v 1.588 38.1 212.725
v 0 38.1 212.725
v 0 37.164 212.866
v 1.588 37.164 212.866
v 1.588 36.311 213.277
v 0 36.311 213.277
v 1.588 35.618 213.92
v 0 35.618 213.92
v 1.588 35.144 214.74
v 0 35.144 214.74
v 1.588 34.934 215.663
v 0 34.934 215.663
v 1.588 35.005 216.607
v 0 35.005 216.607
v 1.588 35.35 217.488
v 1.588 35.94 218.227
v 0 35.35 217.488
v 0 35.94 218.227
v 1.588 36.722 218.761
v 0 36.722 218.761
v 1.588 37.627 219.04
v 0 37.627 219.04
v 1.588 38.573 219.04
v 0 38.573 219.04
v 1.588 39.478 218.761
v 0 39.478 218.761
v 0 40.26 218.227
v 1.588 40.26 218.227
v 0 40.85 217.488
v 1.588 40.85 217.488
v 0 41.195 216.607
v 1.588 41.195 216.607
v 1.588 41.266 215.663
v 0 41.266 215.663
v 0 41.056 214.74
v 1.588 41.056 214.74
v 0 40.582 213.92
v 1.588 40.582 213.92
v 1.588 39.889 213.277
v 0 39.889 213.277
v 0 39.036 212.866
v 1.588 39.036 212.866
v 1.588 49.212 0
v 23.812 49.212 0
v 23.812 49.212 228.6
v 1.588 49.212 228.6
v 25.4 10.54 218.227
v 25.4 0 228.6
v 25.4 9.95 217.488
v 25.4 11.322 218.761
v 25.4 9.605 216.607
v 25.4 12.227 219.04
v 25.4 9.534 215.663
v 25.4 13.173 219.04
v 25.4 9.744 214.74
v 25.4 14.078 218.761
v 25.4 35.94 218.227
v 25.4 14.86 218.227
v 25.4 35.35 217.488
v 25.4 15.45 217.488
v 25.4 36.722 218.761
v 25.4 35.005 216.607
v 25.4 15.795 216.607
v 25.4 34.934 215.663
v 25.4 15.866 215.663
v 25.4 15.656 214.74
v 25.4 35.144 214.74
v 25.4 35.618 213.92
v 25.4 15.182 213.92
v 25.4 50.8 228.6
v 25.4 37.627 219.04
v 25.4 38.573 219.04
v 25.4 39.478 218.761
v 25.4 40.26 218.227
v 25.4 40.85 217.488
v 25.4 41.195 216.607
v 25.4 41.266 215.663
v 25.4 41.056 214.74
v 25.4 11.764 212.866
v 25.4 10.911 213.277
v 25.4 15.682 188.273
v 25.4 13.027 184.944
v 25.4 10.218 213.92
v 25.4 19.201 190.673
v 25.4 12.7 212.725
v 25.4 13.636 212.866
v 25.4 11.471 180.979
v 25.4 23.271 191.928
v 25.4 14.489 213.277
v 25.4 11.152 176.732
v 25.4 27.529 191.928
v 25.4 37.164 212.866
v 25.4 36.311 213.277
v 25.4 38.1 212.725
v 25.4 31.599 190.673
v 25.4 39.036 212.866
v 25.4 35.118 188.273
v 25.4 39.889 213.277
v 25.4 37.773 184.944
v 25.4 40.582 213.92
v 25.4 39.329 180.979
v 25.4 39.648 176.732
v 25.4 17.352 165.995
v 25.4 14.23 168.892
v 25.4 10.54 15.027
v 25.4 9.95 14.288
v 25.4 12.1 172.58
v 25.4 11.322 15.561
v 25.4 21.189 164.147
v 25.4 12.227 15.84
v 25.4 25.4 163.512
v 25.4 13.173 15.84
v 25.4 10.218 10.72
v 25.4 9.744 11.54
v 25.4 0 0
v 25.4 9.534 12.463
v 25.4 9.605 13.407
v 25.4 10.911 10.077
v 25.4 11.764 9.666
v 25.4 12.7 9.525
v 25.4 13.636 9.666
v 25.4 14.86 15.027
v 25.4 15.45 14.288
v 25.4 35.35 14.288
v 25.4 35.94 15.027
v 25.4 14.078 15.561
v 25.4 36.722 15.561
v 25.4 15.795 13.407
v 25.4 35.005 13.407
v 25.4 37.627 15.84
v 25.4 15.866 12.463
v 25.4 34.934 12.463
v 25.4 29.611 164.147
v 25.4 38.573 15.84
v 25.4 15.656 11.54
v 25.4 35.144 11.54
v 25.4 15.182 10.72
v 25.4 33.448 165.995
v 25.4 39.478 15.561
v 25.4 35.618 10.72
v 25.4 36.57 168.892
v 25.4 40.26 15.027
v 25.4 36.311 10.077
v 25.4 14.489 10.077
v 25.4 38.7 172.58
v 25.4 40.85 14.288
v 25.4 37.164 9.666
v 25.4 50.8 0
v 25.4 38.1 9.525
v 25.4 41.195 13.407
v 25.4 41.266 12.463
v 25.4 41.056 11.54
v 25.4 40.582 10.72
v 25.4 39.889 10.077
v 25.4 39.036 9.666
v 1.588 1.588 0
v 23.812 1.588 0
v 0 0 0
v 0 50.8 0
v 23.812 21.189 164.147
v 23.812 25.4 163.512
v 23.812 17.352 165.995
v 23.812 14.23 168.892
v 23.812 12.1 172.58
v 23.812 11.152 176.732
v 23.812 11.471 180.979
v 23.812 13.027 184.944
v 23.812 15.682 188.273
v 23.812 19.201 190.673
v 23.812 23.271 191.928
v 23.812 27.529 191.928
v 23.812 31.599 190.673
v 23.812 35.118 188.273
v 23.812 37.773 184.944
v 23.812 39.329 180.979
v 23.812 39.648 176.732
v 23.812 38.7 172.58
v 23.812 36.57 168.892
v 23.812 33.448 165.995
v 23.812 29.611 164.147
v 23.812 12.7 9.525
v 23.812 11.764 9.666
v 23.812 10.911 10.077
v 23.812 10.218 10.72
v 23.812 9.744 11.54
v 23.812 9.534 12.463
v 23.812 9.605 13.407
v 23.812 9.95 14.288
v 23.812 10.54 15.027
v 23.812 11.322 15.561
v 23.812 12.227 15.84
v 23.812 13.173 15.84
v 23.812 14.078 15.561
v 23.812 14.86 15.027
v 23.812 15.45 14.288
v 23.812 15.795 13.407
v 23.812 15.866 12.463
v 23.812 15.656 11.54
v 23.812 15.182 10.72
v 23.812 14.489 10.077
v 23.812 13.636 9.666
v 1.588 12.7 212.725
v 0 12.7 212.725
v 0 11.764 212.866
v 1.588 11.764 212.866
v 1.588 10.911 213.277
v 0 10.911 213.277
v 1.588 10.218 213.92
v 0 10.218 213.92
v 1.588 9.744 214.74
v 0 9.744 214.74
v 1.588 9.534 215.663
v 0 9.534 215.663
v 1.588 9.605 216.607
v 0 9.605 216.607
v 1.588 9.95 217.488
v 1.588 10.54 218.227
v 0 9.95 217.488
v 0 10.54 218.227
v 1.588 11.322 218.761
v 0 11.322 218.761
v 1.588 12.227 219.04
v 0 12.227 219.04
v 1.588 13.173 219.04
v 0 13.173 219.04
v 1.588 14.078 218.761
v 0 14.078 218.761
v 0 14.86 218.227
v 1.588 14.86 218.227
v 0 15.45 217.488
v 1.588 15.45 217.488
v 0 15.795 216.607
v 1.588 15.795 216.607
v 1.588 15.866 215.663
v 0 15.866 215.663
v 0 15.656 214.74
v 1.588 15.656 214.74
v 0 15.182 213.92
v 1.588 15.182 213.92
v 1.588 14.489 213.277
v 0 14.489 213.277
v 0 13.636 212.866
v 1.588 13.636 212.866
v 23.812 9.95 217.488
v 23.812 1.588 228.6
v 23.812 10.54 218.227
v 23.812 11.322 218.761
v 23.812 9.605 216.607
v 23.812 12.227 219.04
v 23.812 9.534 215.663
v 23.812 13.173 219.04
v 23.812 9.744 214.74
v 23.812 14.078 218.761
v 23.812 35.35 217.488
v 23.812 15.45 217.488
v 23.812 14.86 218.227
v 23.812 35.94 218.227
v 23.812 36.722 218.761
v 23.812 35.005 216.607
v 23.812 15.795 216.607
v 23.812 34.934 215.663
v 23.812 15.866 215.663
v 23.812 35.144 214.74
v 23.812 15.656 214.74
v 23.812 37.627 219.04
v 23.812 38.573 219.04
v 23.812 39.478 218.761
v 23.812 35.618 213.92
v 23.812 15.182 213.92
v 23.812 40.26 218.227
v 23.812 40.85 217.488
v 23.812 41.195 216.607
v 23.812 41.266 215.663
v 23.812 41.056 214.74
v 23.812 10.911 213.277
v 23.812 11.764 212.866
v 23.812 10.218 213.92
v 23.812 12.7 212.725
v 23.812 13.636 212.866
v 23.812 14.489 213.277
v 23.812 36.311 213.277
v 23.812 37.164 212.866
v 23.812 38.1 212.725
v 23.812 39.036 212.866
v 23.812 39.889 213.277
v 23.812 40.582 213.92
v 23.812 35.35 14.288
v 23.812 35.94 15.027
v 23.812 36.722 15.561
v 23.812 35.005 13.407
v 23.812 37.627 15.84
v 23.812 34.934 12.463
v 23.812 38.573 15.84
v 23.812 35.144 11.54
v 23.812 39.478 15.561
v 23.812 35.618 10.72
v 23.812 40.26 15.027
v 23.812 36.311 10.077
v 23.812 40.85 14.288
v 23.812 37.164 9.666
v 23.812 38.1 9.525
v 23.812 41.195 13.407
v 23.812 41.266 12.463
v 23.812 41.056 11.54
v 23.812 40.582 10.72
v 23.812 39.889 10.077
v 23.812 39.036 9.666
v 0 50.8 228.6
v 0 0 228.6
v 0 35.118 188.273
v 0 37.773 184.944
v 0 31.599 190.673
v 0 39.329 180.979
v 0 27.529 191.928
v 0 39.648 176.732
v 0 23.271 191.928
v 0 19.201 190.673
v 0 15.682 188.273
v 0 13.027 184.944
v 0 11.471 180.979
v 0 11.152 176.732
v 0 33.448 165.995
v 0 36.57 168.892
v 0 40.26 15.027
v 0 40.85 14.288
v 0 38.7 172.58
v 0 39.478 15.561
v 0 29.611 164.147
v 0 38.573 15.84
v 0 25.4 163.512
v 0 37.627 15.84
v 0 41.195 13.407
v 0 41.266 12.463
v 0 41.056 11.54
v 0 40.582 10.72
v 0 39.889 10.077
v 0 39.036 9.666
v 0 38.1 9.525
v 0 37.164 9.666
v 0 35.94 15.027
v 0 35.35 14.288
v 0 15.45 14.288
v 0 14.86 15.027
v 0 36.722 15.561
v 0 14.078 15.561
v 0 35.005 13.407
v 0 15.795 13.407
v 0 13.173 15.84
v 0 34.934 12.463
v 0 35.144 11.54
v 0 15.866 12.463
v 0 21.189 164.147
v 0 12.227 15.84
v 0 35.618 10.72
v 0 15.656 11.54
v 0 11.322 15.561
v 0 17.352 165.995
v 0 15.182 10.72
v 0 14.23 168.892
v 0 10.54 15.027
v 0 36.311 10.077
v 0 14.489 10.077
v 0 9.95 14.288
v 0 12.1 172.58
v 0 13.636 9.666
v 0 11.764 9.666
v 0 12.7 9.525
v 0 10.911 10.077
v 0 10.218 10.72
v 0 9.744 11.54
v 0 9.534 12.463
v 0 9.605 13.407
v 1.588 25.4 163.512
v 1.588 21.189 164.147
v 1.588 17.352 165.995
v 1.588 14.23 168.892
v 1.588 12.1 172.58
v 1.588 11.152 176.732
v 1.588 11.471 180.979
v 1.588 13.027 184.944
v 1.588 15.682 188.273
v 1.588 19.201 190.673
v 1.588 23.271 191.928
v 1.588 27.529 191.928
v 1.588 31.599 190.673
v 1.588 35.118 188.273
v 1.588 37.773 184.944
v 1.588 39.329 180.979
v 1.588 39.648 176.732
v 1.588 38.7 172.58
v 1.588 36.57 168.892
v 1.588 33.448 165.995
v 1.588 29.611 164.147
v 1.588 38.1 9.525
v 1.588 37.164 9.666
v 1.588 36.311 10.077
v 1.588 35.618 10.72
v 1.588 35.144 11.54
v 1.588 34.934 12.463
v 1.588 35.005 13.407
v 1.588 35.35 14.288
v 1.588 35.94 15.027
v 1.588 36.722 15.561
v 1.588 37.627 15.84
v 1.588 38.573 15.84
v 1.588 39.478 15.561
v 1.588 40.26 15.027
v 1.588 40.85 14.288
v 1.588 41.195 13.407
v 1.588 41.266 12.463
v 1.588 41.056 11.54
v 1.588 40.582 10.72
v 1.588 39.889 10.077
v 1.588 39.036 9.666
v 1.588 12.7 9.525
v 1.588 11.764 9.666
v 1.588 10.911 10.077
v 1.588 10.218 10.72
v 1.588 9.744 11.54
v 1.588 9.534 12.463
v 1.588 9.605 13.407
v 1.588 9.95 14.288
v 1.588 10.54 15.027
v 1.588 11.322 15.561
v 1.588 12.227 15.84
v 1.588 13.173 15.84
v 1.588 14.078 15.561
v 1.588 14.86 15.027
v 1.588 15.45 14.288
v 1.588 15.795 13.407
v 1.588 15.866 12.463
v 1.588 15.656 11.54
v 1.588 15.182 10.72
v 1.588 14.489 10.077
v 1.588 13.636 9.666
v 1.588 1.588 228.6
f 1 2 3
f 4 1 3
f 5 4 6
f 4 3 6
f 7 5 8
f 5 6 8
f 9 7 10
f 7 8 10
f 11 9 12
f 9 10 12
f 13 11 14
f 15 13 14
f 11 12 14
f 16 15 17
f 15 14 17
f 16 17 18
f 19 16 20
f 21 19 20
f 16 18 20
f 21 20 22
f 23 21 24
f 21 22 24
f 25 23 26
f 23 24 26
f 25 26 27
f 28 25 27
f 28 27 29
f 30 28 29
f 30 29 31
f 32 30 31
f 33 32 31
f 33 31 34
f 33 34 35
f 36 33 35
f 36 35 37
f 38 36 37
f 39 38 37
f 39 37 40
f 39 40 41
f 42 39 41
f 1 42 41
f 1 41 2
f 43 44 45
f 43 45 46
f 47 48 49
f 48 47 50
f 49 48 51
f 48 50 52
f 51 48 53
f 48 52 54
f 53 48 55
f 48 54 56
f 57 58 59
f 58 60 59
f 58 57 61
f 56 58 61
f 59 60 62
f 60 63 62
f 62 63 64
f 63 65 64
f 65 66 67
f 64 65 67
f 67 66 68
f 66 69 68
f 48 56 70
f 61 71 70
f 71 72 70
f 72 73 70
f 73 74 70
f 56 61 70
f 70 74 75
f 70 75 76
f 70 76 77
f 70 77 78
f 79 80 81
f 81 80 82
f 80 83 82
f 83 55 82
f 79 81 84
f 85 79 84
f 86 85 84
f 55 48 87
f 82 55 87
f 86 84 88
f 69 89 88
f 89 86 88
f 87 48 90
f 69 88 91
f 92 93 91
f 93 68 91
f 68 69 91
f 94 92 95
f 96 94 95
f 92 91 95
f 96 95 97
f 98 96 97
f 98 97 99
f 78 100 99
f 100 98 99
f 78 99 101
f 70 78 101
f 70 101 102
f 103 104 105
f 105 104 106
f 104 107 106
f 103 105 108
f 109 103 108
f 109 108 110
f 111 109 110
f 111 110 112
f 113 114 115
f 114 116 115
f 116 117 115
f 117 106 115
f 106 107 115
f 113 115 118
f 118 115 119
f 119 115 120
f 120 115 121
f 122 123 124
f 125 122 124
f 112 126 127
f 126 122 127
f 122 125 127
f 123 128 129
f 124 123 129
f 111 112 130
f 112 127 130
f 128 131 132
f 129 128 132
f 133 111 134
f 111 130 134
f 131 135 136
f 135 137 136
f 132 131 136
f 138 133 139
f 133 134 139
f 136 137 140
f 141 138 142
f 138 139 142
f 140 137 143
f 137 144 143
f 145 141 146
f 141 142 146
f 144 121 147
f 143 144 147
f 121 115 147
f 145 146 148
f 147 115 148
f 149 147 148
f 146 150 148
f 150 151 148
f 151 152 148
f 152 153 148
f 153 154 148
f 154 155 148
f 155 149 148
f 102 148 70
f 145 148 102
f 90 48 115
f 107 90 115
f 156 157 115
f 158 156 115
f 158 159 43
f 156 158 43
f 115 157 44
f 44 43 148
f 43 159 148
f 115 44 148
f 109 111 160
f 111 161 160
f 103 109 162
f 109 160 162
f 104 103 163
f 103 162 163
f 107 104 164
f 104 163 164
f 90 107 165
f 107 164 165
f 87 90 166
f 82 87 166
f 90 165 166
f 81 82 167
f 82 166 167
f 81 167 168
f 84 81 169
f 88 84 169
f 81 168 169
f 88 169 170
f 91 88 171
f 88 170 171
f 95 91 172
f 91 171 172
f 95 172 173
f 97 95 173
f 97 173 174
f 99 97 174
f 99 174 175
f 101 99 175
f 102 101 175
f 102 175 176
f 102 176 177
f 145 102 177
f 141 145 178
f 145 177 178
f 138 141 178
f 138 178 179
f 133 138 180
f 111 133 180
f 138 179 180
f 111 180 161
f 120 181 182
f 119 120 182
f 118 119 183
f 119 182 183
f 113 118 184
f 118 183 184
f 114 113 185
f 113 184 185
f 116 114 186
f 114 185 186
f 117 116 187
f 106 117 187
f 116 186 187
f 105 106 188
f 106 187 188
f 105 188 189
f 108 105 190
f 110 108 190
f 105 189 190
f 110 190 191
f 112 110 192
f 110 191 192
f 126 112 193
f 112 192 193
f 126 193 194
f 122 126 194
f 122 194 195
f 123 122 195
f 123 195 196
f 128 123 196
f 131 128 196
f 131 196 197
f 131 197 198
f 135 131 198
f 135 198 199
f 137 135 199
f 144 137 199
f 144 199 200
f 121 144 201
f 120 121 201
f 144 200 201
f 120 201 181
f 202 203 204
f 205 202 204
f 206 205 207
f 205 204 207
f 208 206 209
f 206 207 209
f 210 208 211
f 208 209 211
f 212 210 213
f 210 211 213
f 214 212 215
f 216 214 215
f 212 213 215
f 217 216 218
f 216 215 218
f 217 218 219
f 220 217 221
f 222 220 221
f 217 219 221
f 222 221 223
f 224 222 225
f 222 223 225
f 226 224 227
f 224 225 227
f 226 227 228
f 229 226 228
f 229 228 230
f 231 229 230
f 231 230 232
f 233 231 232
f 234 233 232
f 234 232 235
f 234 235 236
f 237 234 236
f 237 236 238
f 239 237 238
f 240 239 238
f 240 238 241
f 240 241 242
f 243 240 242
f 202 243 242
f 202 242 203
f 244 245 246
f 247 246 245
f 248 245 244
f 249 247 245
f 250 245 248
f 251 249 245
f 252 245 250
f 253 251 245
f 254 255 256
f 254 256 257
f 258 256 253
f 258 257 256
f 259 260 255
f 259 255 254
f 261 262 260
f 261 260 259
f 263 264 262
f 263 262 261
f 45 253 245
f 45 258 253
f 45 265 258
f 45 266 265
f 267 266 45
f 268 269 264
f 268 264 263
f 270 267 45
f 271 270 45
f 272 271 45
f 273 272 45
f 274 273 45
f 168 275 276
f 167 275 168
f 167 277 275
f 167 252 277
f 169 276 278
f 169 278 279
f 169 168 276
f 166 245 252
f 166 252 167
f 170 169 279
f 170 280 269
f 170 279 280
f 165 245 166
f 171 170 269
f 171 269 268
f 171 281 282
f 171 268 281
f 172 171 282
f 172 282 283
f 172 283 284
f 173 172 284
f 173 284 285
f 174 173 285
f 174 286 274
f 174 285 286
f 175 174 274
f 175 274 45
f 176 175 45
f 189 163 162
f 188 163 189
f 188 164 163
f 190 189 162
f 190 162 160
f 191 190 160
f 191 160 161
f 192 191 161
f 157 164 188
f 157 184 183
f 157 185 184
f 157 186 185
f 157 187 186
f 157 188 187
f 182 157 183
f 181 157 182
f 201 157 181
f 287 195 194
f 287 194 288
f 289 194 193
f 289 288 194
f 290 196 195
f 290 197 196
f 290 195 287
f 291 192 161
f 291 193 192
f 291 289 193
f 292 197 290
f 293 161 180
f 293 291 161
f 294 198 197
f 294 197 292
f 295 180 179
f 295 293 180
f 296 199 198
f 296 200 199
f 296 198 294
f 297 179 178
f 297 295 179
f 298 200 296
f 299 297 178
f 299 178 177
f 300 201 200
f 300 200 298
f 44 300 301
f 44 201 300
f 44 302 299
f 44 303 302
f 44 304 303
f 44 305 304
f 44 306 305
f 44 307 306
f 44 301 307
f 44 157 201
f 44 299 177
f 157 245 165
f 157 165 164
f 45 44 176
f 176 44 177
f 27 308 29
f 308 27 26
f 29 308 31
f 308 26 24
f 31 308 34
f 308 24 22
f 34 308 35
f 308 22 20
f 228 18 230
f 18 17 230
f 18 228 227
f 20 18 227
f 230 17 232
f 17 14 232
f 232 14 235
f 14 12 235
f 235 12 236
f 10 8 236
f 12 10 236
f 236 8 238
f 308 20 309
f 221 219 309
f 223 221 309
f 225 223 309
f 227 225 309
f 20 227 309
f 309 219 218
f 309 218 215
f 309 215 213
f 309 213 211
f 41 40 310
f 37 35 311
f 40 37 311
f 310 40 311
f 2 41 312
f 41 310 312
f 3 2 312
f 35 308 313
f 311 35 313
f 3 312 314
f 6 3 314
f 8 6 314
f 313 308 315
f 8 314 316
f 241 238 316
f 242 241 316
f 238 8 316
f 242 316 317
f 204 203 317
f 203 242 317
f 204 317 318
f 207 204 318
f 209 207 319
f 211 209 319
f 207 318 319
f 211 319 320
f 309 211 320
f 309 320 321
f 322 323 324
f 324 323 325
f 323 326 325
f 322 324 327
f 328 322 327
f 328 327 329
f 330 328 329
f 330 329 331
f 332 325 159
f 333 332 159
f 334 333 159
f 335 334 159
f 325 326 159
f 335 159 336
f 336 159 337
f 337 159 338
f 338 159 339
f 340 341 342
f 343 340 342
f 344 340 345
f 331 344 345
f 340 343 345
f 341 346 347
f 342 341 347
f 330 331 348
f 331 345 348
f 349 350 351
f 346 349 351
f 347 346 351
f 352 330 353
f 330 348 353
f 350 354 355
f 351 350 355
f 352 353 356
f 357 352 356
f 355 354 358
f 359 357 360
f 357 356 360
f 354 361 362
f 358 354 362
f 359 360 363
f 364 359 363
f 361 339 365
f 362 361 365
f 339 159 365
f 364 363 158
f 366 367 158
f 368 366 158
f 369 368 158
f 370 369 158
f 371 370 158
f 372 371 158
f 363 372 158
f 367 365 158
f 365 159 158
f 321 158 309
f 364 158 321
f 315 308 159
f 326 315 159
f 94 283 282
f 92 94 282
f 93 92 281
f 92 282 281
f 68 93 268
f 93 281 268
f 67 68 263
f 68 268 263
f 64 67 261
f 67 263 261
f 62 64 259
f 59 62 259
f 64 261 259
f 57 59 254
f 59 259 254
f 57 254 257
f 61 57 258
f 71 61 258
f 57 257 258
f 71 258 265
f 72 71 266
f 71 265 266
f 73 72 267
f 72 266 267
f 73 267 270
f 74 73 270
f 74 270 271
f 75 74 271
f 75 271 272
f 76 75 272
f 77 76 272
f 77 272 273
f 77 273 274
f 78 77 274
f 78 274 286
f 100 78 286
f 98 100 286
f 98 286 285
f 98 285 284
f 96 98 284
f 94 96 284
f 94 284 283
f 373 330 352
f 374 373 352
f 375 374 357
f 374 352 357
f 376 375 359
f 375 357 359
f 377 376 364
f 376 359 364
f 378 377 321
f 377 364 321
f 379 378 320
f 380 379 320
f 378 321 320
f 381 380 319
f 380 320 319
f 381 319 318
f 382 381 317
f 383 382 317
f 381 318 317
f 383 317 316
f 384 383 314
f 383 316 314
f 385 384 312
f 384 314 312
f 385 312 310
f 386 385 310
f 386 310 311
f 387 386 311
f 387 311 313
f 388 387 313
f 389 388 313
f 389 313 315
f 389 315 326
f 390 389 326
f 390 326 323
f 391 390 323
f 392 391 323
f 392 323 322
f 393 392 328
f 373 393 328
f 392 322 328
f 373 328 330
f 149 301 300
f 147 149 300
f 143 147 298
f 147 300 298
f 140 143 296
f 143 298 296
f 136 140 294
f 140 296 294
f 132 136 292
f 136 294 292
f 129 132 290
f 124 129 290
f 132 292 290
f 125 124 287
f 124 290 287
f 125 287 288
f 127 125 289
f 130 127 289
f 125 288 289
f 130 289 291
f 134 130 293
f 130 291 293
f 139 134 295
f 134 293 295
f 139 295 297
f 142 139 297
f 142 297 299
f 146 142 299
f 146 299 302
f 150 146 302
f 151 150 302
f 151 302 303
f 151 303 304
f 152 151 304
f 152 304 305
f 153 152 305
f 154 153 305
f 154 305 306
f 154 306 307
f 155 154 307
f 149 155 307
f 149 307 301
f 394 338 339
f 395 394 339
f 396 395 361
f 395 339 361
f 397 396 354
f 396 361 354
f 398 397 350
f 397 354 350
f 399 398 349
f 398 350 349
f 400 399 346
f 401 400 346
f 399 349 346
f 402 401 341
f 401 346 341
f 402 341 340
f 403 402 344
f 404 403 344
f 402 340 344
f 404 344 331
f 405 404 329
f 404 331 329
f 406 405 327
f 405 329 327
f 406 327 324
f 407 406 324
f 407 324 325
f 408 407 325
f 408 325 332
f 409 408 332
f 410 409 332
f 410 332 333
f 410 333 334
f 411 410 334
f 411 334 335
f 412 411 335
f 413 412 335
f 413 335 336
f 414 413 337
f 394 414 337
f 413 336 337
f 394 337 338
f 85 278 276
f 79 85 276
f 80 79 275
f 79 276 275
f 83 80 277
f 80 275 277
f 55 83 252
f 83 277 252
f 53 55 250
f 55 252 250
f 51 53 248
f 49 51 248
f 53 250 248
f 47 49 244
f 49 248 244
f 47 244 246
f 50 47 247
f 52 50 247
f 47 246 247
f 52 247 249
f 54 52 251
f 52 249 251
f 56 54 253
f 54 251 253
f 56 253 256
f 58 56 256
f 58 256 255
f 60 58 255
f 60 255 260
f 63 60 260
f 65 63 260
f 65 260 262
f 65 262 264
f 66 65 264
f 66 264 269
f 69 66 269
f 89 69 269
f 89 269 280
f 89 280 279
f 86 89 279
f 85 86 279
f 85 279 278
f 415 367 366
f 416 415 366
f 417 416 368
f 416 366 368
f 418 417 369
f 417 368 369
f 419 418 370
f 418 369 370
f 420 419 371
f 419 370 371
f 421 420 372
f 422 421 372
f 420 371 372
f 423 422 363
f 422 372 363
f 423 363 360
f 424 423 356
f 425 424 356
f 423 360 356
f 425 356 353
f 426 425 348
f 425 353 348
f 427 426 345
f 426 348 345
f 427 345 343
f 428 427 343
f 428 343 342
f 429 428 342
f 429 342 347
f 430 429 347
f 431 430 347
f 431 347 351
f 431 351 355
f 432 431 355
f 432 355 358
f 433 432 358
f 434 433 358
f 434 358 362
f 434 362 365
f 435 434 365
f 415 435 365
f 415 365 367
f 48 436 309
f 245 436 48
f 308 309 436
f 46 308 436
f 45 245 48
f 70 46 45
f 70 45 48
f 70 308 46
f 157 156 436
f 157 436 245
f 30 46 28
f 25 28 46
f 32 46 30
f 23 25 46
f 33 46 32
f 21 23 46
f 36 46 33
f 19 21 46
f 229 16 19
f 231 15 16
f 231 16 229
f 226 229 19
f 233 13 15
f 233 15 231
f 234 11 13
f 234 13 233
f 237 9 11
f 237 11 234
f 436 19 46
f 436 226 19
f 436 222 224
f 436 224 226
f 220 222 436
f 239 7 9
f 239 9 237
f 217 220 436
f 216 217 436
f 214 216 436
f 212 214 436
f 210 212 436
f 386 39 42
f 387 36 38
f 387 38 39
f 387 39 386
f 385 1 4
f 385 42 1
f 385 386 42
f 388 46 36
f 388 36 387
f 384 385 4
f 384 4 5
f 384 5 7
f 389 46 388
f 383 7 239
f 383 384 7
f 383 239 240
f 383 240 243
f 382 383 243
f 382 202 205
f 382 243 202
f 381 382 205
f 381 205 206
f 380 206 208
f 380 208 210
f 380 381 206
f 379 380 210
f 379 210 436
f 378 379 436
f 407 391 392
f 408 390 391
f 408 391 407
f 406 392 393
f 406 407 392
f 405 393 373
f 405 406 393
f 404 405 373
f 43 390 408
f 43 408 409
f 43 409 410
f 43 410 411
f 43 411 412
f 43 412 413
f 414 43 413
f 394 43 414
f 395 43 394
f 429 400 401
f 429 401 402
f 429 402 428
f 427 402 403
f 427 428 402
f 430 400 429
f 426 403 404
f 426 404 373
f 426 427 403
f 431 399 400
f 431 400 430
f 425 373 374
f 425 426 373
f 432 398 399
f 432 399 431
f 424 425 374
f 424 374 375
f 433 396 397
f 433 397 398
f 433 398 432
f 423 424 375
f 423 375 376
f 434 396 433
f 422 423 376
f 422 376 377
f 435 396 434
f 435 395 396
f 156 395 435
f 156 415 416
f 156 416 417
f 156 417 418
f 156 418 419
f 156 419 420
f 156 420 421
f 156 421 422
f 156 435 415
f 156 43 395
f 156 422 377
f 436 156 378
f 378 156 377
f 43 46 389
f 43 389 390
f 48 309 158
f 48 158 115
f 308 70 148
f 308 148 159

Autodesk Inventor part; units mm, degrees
ref_plane "YZ Plane" through (0, 0, 0) normal (1, 0, 0) x (0, 1, 0)
ref_plane "XZ Plane" through (0, 0, 0) normal (0, 1, 0) x (-1, 0, 0)
ref_plane "XY Plane" through (0, 0, 0) normal (0, 0, 1) x (1, 0, 0)
sketch "Sketch1" plane through (0, 0, 0) normal (0, 0, 1) x (1, 0, 0)
  line L0 (0, 0) -> (25.4, 0)
  line L1 (25.4, 0) -> (25.4, 50.8)
  line L2 (25.4, 50.8) -> (0, 50.8)
  line L3 (0, 50.8) -> (0, 0)
  dimension "d0" = 25.4
  dimension "d1" = 50.8
extrude "Extrusion1" add sketch "Sketch1" along normal blind 228.6
shell "Shell1" thickness 1.5875 removed faces 2 at (8.4667, 16.9333, 0) at (8.4667, 16.9333, 228.6)
hole "Hole3" at (25.4, 38.1, 12.7) direction (-1, 0, 0) diameter 6.35 end through all
hole "Hole4" at (25.4, 12.7, 12.7) direction (-1, 0, 0) diameter 6.35 end through all
hole "Hole5" at (25.4, 25.4, 177.8) direction (-1, 0, 0) diameter 28.575 end through all
hole "Hole7" at (25.4, 38.1, 215.9) direction (-1, 0, 0) diameter 6.35 end through all
hole "Hole8" at (25.4, 12.7, 215.9) direction (-1, 0, 0) diameter 6.35 end through all
properties part number "Roller Wheel Right Side Support Beam"
